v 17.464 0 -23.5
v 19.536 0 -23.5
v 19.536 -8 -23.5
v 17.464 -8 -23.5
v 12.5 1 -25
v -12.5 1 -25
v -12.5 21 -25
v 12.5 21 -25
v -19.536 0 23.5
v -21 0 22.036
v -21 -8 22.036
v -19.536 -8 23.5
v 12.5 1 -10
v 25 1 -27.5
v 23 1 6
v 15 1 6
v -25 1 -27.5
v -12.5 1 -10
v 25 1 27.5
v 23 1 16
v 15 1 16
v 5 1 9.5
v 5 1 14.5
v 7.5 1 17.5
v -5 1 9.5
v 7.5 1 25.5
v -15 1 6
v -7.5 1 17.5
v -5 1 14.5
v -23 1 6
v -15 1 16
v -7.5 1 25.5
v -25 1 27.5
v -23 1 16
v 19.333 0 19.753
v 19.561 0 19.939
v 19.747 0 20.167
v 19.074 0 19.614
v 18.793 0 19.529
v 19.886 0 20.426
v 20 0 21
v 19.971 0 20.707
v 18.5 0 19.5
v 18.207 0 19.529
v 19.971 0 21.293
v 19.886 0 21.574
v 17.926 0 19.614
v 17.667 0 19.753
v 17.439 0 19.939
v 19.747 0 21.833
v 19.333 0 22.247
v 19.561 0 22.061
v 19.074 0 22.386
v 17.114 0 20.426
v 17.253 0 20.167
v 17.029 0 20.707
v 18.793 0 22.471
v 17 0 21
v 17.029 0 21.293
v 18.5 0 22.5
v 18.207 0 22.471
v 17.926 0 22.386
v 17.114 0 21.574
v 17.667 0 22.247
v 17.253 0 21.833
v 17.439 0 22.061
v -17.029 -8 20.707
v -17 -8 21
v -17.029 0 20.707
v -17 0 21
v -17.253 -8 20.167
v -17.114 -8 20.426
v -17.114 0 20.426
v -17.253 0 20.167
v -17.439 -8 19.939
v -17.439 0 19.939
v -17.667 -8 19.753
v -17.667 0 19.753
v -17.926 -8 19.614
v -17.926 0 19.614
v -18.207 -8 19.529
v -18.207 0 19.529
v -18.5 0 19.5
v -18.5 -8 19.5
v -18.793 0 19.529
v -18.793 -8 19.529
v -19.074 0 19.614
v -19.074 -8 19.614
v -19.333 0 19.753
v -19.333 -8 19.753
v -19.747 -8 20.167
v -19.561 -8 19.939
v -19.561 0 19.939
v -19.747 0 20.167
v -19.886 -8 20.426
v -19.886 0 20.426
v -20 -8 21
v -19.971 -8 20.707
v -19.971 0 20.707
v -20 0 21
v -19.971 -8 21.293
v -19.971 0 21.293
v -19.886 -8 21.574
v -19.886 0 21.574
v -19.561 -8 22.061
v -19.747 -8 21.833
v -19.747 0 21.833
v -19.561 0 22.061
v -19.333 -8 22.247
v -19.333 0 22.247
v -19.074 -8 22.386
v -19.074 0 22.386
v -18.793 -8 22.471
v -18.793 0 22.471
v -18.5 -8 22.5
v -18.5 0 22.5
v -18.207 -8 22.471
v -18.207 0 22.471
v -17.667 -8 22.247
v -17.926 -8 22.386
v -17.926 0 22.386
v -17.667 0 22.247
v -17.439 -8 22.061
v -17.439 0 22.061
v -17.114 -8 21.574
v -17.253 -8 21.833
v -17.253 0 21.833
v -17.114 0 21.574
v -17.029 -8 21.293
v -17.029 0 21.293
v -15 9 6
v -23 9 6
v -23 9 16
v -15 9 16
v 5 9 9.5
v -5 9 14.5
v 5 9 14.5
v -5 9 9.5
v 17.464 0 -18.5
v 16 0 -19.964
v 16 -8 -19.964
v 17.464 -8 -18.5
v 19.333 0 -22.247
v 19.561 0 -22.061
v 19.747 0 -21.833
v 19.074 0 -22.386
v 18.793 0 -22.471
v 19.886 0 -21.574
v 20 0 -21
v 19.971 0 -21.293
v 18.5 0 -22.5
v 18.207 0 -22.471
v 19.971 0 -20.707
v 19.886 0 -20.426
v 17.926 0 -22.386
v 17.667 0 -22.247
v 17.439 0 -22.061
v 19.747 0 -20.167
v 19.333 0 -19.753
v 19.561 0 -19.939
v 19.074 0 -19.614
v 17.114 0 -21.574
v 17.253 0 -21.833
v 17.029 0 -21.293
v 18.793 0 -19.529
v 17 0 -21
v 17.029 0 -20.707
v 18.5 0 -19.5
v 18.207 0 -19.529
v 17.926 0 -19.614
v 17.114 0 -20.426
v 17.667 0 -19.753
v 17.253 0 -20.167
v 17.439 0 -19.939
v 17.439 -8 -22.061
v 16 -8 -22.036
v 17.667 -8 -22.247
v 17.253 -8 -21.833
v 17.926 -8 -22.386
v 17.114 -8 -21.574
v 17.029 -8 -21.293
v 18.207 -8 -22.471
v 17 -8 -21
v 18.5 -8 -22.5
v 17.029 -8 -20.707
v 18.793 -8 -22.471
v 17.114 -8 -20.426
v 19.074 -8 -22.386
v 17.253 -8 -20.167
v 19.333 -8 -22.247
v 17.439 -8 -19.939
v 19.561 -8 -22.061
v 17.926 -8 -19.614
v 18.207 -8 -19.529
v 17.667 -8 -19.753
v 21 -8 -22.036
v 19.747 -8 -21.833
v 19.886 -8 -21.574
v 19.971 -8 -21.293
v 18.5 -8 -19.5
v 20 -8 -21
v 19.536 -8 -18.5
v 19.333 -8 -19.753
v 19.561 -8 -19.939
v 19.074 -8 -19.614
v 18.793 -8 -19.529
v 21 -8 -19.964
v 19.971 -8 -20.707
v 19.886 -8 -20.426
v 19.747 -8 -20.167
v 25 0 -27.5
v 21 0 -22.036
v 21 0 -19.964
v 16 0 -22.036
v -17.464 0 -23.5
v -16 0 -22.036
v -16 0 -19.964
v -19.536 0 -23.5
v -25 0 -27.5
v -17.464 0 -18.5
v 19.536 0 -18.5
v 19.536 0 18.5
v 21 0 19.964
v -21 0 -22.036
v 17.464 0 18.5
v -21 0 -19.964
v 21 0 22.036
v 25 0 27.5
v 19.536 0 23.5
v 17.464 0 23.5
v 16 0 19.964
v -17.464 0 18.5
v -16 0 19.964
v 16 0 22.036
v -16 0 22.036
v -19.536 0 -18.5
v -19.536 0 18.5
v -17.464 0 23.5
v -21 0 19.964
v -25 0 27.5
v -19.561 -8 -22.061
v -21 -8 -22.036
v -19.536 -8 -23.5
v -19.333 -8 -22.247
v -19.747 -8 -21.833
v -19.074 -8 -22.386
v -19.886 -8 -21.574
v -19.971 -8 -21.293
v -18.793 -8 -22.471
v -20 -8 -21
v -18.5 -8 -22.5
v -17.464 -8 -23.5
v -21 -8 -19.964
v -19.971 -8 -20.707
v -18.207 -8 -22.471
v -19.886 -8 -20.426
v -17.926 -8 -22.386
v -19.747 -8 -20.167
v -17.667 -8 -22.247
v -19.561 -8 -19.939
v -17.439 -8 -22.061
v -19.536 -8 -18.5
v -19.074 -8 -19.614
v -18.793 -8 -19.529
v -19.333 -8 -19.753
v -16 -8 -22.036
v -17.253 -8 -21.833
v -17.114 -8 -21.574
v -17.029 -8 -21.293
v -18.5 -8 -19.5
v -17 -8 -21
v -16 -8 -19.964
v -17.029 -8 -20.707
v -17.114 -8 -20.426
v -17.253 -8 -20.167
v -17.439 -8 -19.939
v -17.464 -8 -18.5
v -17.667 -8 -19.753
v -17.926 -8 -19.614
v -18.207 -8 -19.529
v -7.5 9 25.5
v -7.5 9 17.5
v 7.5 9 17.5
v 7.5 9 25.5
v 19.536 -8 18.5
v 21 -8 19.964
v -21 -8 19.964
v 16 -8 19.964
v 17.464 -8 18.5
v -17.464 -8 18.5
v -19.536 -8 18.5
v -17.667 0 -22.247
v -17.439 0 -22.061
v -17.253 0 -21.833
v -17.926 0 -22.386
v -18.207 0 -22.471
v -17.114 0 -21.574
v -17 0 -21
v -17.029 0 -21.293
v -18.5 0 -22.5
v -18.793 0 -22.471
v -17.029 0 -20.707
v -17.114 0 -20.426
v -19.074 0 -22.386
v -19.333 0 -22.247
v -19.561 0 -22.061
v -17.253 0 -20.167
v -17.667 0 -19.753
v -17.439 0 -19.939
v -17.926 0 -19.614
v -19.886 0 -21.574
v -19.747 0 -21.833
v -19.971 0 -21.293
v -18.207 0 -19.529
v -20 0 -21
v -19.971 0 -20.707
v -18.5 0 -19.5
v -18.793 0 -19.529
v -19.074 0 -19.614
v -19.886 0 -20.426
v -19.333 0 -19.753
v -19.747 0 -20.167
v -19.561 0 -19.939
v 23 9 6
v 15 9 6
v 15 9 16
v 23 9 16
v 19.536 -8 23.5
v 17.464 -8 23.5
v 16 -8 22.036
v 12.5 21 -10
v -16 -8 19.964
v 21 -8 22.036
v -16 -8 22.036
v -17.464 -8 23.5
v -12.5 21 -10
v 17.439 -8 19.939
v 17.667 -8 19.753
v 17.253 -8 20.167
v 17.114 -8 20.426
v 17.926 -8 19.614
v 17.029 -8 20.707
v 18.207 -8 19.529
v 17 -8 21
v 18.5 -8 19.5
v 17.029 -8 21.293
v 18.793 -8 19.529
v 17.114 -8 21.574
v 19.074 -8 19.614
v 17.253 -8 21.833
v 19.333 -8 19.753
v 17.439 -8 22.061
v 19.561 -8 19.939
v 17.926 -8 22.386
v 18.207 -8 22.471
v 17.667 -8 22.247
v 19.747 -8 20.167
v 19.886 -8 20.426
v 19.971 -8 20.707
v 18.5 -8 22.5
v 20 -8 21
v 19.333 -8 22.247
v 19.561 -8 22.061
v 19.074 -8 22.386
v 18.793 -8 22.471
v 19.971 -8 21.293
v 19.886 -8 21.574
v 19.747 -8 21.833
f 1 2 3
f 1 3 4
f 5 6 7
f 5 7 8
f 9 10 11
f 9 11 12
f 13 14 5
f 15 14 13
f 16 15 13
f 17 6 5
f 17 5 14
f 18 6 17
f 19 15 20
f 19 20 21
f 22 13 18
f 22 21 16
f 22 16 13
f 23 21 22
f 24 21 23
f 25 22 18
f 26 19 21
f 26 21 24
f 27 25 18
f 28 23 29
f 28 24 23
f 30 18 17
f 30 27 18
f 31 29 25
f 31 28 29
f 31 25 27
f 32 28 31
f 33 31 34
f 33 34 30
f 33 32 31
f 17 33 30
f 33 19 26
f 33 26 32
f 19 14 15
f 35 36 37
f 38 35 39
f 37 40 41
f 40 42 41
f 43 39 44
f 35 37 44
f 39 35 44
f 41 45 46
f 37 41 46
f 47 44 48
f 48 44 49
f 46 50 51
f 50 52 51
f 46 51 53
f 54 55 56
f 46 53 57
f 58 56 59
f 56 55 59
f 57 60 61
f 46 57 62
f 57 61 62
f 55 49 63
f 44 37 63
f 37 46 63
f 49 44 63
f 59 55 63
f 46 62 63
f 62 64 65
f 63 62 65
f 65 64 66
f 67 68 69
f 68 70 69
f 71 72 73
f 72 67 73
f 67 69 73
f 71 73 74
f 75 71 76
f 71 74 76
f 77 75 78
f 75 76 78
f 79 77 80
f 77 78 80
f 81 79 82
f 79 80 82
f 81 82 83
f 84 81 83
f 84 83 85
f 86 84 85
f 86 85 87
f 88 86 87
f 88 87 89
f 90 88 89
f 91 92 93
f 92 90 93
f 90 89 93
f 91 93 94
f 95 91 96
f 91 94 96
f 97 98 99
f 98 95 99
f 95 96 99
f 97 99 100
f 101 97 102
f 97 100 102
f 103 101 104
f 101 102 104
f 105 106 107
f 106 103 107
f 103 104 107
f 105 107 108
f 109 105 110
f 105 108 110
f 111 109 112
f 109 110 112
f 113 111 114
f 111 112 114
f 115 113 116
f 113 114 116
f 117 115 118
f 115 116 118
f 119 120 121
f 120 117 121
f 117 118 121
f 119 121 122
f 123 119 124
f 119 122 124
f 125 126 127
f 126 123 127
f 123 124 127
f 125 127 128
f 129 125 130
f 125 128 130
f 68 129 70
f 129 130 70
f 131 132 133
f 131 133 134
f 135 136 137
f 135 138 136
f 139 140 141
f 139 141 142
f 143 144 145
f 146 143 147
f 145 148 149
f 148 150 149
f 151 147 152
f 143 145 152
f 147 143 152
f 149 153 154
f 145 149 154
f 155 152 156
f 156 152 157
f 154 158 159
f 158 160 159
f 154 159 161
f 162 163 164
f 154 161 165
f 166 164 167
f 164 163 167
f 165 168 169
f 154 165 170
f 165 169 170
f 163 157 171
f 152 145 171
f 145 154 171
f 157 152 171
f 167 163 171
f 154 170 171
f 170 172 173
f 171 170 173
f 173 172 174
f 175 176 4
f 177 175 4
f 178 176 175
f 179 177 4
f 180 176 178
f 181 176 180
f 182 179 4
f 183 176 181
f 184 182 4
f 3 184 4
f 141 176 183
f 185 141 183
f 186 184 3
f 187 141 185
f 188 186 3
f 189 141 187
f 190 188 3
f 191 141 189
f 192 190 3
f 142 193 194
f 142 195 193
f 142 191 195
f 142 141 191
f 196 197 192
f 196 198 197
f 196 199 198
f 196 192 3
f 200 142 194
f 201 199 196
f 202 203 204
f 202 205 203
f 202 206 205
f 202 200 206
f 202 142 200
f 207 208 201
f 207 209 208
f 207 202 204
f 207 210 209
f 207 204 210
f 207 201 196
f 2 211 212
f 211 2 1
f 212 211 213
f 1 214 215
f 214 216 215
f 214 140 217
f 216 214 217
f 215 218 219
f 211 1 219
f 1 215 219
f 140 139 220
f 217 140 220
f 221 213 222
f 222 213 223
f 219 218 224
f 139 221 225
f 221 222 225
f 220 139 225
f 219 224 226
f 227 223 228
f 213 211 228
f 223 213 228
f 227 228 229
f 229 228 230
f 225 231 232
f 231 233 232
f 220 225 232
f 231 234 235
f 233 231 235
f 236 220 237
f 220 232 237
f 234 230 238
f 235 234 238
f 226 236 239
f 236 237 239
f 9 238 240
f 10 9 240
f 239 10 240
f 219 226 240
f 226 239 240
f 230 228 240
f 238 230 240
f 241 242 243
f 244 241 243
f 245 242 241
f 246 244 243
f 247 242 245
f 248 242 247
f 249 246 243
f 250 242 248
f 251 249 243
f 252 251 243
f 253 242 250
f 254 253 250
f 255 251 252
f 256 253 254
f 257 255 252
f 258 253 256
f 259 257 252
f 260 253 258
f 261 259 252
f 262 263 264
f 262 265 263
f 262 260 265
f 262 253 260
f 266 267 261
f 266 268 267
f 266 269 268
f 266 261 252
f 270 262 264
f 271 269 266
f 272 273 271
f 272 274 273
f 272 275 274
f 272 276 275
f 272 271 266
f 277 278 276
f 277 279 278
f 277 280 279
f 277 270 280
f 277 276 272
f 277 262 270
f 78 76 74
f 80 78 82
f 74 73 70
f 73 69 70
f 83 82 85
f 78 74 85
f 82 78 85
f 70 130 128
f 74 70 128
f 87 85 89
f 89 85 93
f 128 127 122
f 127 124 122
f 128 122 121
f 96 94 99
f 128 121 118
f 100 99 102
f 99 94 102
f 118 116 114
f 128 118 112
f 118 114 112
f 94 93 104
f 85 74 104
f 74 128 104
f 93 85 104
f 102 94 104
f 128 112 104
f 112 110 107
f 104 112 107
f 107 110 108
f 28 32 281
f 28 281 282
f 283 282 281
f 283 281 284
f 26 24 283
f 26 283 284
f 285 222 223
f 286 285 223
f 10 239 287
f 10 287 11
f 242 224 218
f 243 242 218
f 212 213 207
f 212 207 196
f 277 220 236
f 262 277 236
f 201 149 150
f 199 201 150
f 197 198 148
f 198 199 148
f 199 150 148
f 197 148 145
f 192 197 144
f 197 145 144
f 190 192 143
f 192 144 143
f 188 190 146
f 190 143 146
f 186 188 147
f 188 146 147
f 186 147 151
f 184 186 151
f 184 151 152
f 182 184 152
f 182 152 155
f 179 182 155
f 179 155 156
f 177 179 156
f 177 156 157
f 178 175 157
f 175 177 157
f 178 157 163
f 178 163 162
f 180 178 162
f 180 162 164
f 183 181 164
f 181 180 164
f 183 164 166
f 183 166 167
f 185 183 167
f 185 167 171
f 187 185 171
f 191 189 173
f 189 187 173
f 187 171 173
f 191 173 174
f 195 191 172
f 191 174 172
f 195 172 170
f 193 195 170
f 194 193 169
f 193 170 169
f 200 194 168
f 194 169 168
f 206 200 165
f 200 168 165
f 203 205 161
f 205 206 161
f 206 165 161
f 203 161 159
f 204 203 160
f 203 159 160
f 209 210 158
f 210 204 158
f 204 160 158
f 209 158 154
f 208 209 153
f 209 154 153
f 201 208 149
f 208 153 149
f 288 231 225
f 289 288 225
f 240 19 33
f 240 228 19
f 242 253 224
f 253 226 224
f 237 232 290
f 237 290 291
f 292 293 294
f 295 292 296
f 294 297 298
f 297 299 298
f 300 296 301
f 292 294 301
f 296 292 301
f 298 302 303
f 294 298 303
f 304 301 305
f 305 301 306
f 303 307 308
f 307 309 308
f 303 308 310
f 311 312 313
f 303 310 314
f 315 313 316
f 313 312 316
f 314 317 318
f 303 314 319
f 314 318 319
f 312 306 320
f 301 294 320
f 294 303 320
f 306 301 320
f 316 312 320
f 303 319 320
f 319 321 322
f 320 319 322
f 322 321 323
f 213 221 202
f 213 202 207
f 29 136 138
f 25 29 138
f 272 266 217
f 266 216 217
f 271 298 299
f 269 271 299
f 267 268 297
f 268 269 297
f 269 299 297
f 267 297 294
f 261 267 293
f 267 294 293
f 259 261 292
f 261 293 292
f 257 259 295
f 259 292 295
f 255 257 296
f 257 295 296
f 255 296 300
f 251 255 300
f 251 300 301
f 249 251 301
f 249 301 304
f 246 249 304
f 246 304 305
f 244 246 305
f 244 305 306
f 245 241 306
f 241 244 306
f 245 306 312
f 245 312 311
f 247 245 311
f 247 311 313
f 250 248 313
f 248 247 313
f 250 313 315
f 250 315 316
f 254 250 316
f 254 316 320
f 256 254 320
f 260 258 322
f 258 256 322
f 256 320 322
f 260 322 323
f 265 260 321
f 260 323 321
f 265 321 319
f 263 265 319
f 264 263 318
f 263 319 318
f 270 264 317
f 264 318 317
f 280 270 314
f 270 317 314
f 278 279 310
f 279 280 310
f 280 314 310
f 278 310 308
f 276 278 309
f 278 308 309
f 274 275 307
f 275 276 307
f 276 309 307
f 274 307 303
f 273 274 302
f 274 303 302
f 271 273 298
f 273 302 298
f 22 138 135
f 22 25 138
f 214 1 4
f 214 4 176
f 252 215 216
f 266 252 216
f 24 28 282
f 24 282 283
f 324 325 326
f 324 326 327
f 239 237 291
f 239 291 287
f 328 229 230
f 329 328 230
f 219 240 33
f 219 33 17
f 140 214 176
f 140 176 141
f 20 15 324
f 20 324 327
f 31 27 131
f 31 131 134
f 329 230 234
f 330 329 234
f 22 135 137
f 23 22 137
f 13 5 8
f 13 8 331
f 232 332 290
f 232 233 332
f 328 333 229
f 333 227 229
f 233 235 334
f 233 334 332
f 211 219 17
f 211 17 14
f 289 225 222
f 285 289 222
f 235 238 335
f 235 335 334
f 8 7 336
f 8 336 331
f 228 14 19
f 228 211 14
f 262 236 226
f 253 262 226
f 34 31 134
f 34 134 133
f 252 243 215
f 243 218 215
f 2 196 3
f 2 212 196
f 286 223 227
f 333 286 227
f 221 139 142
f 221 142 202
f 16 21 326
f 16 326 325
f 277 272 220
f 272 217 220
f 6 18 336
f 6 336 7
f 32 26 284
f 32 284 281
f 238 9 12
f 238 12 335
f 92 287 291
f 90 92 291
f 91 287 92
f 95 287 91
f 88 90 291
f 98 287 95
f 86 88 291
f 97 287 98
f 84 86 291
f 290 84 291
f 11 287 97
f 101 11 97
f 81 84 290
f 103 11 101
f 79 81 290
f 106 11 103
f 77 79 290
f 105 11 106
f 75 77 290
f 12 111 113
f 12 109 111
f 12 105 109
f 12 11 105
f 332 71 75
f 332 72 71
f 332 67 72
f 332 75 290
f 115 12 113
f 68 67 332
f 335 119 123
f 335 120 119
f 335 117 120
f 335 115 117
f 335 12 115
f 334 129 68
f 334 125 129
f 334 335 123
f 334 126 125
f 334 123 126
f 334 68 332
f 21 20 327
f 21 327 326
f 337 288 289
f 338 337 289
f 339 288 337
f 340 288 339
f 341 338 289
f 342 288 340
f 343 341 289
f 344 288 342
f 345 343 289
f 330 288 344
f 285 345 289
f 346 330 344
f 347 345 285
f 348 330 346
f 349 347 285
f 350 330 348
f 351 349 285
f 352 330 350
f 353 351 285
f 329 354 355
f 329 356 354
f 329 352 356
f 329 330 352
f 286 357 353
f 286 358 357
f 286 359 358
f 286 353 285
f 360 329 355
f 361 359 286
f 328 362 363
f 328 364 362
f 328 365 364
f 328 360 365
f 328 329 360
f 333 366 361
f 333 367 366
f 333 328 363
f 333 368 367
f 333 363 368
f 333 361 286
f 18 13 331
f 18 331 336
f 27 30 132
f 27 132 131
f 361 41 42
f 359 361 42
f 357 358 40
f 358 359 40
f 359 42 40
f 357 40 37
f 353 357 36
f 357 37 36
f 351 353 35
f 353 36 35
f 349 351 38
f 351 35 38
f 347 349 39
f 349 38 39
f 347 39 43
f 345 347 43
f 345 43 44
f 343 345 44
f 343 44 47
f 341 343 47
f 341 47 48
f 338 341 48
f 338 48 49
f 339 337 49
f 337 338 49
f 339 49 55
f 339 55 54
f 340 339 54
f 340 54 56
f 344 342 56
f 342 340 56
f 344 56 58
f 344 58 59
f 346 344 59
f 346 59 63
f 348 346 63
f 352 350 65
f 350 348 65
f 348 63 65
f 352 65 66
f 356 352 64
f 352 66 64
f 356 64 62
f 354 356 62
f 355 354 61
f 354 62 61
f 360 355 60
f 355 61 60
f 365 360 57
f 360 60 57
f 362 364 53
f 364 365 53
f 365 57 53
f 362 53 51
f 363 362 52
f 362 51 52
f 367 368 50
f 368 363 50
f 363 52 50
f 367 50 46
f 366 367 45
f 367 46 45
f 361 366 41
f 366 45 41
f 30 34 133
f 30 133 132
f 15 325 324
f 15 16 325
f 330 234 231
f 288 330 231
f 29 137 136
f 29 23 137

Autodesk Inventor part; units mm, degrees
ref_plane "YZ Plane" through (0, 0, 0) normal (1, 0, 0) x (0, 1, 0)
ref_plane "XZ Plane" through (0, 0, 0) normal (0, 1, 0) x (-1, 0, 0)
ref_plane "XY Plane" through (0, 0, 0) normal (0, 0, 1) x (1, 0, 0)
sketch "Esquisse1" plane through (0, 0, 0) normal (0, 1, 0) x (-1, 0, 0)
  line L0 (-25, 27.5) -> (25, 27.5)
  line L1 (25, 27.5) -> (25, -27.5)
  line L2 (25, -27.5) -> (-25, -27.5)
  line L3 (-25, -27.5) -> (-25, 27.5)
  point P0 (0, 0)
  dimension "d0" = 55
  dimension "d1" = 50
  dimension "d2" = 25
  dimension "d3" = 27.5
extrude "Extrusion1" add sketch "Esquisse1" along normal blind 1
sketch "Esquisse2" plane through (0, 1, 0) normal (0, 1, 0) x (1, 0, 0)
  line L0 (25, 27.5) -> (-25, 27.5) projected
  line L1 (-12.5, 25) -> (12.5, 25)
  line L2 (12.5, 25) -> (12.5, 10)
  line L3 (12.5, 10) -> (-12.5, 10)
  line L4 (-12.5, 10) -> (-12.5, 25)
  point P0 (0, 0)
  dimension "d6" = 15
  dimension "d7" = 25
  dimension "d8" = 12.5
  dimension "d9" = 2.5
extrude "Extrusion2" add sketch "Esquisse2" along normal blind 20
sketch "Esquisse3" plane through (0, 1, 0) normal (0, 1, 0) x (1, 0, 0)
  line L0 (-25, -27.5) -> (25, -27.5) projected
  line L1 (25, -27.5) -> (25, 27.5) projected
  line L2 (-25, 27.5) -> (-25, -27.5) projected
  line L3 (-23, -6) -> (-15, -6)
  line L4 (-15, -6) -> (-15, -16)
  line L5 (-15, -16) -> (-23, -16)
  line L6 (-23, -16) -> (-23, -6)
  line L7 (15, -6) -> (23, -6)
  line L8 (23, -6) -> (23, -16)
  line L9 (23, -16) -> (15, -16)
  line L10 (15, -16) -> (15, -6)
  line L11 (-7.5, -17.5) -> (7.5, -17.5)
  line L12 (7.5, -17.5) -> (7.5, -25.5)
  line L13 (7.5, -25.5) -> (-7.5, -25.5)
  line L14 (-7.5, -25.5) -> (-7.5, -17.5)
  line L15 (-5, -9.5) -> (5, -9.5)
  line L16 (5, -9.5) -> (5, -14.5)
  line L17 (5, -14.5) -> (-5, -14.5)
  line L18 (-5, -14.5) -> (-5, -9.5)
  point P0 (0, 0)
  dimension "d12" = 10
  dimension "d13" = 10
  dimension "d14" = 10
  dimension "d15" = 8
  dimension "d16" = 8
  dimension "d17" = 15
  dimension "d18" = 8
  dimension "d19" = 5
  dimension "d20" = 5
  dimension "d21" = 2
  dimension "d22" = 2
  dimension "d23" = 2
  dimension "d24" = 7.5
  dimension "d25" = 6
  dimension "d26" = 3
extrude "Extrusion3" add sketch "Esquisse3" along normal blind 8
sketch "Esquisse4" plane through (0, 0, 0) normal (0, -1, 0) x (1, 0, 0)
  line L0 (25, 27.5) -> (-25, 27.5) projected
  line L1 (-25, 27.5) -> (-25, -27.5) projected
  line L2 (-19.5355, 23.5) -> (-17.4645, 23.5)
  line L3 (-17.4645, 23.5) -> (-17.4645, 18.5) construction
  line L4 (-17.4645, 18.5) -> (-19.5355, 18.5)
  line L5 (-19.5355, 18.5) -> (-19.5355, 23.5) construction
  line L6 (-21, 22.0355) -> (-16, 22.0355) construction
  line L7 (-16, 22.0355) -> (-16, 19.9645)
  line L8 (-16, 19.9645) -> (-21, 19.9645) construction
  line L9 (-21, 19.9645) -> (-21, 22.0355)
  line L10 (-21, 22.0355) -> (-19.5355, 23.5)
  line L11 (-17.4645, 23.5) -> (-16, 22.0355)
  line L12 (-16, 19.9645) -> (-17.4645, 18.5)
  line L13 (-19.5355, 18.5) -> (-21, 19.9645)
  line L14 (-19.5355, 22.0355) -> (-17.4645, 19.9645) construction
  line L15 (-17.4645, 22.0355) -> (-19.5355, 19.9645) construction
  circle A0 centre (-18.5, 21) radius 1.5
  line L16 (0, 0) -> (0, 27.5) construction
  line L17 (0, 0) -> (-25, 0) construction
  line L18 (19.5355, 23.5) -> (17.4645, 23.5)
  line L19 (17.4645, 23.5) -> (17.4645, 18.5) construction
  line L20 (17.4645, 18.5) -> (19.5355, 18.5)
  line L21 (19.5355, 18.5) -> (19.5355, 23.5) construction
  line L22 (21, 22.0355) -> (16, 22.0355) construction
  line L23 (16, 22.0355) -> (16, 19.9645)
  line L24 (16, 19.9645) -> (21, 19.9645) construction
  line L25 (21, 19.9645) -> (21, 22.0355)
  line L26 (21, 22.0355) -> (19.5355, 23.5)
  line L27 (17.4645, 23.5) -> (16, 22.0355)
  line L28 (16, 19.9645) -> (17.4645, 18.5)
  line L29 (19.5355, 18.5) -> (21, 19.9645)
  line L30 (19.5355, 22.0355) -> (17.4645, 19.9645) construction
  line L31 (17.4645, 22.0355) -> (19.5355, 19.9645) construction
  circle A1 centre (18.5, 21) radius 1.5
  line L32 (-19.5355, -23.5) -> (-17.4645, -23.5)
  line L33 (-17.4645, -23.5) -> (-17.4645, -18.5) construction
  line L34 (-17.4645, -18.5) -> (-19.5355, -18.5)
  line L35 (-19.5355, -18.5) -> (-19.5355, -23.5) construction
  line L36 (-21, -22.0355) -> (-16, -22.0355) construction
  line L37 (-16, -22.0355) -> (-16, -19.9645)
  line L38 (-16, -19.9645) -> (-21, -19.9645) construction
  line L39 (-21, -19.9645) -> (-21, -22.0355)
  line L40 (-21, -22.0355) -> (-19.5355, -23.5)
  line L41 (-17.4645, -23.5) -> (-16, -22.0355)
  line L42 (-16, -19.9645) -> (-17.4645, -18.5)
  line L43 (-19.5355, -18.5) -> (-21, -19.9645)
  line L44 (-19.5355, -22.0355) -> (-17.4645, -19.9645) construction
  line L45 (-17.4645, -22.0355) -> (-19.5355, -19.9645) construction
  circle A2 centre (-18.5, -21) radius 1.5
  line L46 (16, -19.9645) -> (17.4645, -18.5)
  line L47 (17.4645, -18.5) -> (19.5355, -18.5)
  line L48 (16, -22.0355) -> (16, -19.9645)
  line L49 (16, -19.9645) -> (21, -19.9645) construction
  line L50 (19.5355, -18.5) -> (21, -19.9645)
  line L51 (17.4645, -23.5) -> (17.4645, -18.5) construction
  line L52 (17.4645, -23.5) -> (16, -22.0355)
  line L53 (19.5355, -22.0355) -> (17.4645, -19.9645) construction
  line L54 (17.4645, -22.0355) -> (19.5355, -19.9645) construction
  circle A3 centre (18.5, -21) radius 1.5
  line L55 (21, -22.0355) -> (16, -22.0355) construction
  line L56 (21, -19.9645) -> (21, -22.0355)
  line L57 (19.5355, -18.5) -> (19.5355, -23.5) construction
  line L58 (19.5355, -23.5) -> (17.4645, -23.5)
  line L59 (21, -22.0355) -> (19.5355, -23.5)
  dimension "d29" = 5
  dimension "d30" = 5
  dimension "d31" = 4
  dimension "d32" = 4
  dimension "d35" = 3
extrude "Extrusion4" add sketch "Esquisse4" along normal blind 8
equation "\"d2\" = 0.5 * d1"
equation "\"d3\" = 0.5 * d0"
equation "\"d8\" = 0.5 * d7"
equation "\"d14\" = d13"
equation "\"d16\" = d15"
equation "\"d20\" = 0.5 * d12"
equation "\"d22\" = d21"
equation "\"d23\" = d21"
equation "\"d24\" = 0.5 * d17"
equation "\"d30\" = d29"
properties part number "carte_puissance"
